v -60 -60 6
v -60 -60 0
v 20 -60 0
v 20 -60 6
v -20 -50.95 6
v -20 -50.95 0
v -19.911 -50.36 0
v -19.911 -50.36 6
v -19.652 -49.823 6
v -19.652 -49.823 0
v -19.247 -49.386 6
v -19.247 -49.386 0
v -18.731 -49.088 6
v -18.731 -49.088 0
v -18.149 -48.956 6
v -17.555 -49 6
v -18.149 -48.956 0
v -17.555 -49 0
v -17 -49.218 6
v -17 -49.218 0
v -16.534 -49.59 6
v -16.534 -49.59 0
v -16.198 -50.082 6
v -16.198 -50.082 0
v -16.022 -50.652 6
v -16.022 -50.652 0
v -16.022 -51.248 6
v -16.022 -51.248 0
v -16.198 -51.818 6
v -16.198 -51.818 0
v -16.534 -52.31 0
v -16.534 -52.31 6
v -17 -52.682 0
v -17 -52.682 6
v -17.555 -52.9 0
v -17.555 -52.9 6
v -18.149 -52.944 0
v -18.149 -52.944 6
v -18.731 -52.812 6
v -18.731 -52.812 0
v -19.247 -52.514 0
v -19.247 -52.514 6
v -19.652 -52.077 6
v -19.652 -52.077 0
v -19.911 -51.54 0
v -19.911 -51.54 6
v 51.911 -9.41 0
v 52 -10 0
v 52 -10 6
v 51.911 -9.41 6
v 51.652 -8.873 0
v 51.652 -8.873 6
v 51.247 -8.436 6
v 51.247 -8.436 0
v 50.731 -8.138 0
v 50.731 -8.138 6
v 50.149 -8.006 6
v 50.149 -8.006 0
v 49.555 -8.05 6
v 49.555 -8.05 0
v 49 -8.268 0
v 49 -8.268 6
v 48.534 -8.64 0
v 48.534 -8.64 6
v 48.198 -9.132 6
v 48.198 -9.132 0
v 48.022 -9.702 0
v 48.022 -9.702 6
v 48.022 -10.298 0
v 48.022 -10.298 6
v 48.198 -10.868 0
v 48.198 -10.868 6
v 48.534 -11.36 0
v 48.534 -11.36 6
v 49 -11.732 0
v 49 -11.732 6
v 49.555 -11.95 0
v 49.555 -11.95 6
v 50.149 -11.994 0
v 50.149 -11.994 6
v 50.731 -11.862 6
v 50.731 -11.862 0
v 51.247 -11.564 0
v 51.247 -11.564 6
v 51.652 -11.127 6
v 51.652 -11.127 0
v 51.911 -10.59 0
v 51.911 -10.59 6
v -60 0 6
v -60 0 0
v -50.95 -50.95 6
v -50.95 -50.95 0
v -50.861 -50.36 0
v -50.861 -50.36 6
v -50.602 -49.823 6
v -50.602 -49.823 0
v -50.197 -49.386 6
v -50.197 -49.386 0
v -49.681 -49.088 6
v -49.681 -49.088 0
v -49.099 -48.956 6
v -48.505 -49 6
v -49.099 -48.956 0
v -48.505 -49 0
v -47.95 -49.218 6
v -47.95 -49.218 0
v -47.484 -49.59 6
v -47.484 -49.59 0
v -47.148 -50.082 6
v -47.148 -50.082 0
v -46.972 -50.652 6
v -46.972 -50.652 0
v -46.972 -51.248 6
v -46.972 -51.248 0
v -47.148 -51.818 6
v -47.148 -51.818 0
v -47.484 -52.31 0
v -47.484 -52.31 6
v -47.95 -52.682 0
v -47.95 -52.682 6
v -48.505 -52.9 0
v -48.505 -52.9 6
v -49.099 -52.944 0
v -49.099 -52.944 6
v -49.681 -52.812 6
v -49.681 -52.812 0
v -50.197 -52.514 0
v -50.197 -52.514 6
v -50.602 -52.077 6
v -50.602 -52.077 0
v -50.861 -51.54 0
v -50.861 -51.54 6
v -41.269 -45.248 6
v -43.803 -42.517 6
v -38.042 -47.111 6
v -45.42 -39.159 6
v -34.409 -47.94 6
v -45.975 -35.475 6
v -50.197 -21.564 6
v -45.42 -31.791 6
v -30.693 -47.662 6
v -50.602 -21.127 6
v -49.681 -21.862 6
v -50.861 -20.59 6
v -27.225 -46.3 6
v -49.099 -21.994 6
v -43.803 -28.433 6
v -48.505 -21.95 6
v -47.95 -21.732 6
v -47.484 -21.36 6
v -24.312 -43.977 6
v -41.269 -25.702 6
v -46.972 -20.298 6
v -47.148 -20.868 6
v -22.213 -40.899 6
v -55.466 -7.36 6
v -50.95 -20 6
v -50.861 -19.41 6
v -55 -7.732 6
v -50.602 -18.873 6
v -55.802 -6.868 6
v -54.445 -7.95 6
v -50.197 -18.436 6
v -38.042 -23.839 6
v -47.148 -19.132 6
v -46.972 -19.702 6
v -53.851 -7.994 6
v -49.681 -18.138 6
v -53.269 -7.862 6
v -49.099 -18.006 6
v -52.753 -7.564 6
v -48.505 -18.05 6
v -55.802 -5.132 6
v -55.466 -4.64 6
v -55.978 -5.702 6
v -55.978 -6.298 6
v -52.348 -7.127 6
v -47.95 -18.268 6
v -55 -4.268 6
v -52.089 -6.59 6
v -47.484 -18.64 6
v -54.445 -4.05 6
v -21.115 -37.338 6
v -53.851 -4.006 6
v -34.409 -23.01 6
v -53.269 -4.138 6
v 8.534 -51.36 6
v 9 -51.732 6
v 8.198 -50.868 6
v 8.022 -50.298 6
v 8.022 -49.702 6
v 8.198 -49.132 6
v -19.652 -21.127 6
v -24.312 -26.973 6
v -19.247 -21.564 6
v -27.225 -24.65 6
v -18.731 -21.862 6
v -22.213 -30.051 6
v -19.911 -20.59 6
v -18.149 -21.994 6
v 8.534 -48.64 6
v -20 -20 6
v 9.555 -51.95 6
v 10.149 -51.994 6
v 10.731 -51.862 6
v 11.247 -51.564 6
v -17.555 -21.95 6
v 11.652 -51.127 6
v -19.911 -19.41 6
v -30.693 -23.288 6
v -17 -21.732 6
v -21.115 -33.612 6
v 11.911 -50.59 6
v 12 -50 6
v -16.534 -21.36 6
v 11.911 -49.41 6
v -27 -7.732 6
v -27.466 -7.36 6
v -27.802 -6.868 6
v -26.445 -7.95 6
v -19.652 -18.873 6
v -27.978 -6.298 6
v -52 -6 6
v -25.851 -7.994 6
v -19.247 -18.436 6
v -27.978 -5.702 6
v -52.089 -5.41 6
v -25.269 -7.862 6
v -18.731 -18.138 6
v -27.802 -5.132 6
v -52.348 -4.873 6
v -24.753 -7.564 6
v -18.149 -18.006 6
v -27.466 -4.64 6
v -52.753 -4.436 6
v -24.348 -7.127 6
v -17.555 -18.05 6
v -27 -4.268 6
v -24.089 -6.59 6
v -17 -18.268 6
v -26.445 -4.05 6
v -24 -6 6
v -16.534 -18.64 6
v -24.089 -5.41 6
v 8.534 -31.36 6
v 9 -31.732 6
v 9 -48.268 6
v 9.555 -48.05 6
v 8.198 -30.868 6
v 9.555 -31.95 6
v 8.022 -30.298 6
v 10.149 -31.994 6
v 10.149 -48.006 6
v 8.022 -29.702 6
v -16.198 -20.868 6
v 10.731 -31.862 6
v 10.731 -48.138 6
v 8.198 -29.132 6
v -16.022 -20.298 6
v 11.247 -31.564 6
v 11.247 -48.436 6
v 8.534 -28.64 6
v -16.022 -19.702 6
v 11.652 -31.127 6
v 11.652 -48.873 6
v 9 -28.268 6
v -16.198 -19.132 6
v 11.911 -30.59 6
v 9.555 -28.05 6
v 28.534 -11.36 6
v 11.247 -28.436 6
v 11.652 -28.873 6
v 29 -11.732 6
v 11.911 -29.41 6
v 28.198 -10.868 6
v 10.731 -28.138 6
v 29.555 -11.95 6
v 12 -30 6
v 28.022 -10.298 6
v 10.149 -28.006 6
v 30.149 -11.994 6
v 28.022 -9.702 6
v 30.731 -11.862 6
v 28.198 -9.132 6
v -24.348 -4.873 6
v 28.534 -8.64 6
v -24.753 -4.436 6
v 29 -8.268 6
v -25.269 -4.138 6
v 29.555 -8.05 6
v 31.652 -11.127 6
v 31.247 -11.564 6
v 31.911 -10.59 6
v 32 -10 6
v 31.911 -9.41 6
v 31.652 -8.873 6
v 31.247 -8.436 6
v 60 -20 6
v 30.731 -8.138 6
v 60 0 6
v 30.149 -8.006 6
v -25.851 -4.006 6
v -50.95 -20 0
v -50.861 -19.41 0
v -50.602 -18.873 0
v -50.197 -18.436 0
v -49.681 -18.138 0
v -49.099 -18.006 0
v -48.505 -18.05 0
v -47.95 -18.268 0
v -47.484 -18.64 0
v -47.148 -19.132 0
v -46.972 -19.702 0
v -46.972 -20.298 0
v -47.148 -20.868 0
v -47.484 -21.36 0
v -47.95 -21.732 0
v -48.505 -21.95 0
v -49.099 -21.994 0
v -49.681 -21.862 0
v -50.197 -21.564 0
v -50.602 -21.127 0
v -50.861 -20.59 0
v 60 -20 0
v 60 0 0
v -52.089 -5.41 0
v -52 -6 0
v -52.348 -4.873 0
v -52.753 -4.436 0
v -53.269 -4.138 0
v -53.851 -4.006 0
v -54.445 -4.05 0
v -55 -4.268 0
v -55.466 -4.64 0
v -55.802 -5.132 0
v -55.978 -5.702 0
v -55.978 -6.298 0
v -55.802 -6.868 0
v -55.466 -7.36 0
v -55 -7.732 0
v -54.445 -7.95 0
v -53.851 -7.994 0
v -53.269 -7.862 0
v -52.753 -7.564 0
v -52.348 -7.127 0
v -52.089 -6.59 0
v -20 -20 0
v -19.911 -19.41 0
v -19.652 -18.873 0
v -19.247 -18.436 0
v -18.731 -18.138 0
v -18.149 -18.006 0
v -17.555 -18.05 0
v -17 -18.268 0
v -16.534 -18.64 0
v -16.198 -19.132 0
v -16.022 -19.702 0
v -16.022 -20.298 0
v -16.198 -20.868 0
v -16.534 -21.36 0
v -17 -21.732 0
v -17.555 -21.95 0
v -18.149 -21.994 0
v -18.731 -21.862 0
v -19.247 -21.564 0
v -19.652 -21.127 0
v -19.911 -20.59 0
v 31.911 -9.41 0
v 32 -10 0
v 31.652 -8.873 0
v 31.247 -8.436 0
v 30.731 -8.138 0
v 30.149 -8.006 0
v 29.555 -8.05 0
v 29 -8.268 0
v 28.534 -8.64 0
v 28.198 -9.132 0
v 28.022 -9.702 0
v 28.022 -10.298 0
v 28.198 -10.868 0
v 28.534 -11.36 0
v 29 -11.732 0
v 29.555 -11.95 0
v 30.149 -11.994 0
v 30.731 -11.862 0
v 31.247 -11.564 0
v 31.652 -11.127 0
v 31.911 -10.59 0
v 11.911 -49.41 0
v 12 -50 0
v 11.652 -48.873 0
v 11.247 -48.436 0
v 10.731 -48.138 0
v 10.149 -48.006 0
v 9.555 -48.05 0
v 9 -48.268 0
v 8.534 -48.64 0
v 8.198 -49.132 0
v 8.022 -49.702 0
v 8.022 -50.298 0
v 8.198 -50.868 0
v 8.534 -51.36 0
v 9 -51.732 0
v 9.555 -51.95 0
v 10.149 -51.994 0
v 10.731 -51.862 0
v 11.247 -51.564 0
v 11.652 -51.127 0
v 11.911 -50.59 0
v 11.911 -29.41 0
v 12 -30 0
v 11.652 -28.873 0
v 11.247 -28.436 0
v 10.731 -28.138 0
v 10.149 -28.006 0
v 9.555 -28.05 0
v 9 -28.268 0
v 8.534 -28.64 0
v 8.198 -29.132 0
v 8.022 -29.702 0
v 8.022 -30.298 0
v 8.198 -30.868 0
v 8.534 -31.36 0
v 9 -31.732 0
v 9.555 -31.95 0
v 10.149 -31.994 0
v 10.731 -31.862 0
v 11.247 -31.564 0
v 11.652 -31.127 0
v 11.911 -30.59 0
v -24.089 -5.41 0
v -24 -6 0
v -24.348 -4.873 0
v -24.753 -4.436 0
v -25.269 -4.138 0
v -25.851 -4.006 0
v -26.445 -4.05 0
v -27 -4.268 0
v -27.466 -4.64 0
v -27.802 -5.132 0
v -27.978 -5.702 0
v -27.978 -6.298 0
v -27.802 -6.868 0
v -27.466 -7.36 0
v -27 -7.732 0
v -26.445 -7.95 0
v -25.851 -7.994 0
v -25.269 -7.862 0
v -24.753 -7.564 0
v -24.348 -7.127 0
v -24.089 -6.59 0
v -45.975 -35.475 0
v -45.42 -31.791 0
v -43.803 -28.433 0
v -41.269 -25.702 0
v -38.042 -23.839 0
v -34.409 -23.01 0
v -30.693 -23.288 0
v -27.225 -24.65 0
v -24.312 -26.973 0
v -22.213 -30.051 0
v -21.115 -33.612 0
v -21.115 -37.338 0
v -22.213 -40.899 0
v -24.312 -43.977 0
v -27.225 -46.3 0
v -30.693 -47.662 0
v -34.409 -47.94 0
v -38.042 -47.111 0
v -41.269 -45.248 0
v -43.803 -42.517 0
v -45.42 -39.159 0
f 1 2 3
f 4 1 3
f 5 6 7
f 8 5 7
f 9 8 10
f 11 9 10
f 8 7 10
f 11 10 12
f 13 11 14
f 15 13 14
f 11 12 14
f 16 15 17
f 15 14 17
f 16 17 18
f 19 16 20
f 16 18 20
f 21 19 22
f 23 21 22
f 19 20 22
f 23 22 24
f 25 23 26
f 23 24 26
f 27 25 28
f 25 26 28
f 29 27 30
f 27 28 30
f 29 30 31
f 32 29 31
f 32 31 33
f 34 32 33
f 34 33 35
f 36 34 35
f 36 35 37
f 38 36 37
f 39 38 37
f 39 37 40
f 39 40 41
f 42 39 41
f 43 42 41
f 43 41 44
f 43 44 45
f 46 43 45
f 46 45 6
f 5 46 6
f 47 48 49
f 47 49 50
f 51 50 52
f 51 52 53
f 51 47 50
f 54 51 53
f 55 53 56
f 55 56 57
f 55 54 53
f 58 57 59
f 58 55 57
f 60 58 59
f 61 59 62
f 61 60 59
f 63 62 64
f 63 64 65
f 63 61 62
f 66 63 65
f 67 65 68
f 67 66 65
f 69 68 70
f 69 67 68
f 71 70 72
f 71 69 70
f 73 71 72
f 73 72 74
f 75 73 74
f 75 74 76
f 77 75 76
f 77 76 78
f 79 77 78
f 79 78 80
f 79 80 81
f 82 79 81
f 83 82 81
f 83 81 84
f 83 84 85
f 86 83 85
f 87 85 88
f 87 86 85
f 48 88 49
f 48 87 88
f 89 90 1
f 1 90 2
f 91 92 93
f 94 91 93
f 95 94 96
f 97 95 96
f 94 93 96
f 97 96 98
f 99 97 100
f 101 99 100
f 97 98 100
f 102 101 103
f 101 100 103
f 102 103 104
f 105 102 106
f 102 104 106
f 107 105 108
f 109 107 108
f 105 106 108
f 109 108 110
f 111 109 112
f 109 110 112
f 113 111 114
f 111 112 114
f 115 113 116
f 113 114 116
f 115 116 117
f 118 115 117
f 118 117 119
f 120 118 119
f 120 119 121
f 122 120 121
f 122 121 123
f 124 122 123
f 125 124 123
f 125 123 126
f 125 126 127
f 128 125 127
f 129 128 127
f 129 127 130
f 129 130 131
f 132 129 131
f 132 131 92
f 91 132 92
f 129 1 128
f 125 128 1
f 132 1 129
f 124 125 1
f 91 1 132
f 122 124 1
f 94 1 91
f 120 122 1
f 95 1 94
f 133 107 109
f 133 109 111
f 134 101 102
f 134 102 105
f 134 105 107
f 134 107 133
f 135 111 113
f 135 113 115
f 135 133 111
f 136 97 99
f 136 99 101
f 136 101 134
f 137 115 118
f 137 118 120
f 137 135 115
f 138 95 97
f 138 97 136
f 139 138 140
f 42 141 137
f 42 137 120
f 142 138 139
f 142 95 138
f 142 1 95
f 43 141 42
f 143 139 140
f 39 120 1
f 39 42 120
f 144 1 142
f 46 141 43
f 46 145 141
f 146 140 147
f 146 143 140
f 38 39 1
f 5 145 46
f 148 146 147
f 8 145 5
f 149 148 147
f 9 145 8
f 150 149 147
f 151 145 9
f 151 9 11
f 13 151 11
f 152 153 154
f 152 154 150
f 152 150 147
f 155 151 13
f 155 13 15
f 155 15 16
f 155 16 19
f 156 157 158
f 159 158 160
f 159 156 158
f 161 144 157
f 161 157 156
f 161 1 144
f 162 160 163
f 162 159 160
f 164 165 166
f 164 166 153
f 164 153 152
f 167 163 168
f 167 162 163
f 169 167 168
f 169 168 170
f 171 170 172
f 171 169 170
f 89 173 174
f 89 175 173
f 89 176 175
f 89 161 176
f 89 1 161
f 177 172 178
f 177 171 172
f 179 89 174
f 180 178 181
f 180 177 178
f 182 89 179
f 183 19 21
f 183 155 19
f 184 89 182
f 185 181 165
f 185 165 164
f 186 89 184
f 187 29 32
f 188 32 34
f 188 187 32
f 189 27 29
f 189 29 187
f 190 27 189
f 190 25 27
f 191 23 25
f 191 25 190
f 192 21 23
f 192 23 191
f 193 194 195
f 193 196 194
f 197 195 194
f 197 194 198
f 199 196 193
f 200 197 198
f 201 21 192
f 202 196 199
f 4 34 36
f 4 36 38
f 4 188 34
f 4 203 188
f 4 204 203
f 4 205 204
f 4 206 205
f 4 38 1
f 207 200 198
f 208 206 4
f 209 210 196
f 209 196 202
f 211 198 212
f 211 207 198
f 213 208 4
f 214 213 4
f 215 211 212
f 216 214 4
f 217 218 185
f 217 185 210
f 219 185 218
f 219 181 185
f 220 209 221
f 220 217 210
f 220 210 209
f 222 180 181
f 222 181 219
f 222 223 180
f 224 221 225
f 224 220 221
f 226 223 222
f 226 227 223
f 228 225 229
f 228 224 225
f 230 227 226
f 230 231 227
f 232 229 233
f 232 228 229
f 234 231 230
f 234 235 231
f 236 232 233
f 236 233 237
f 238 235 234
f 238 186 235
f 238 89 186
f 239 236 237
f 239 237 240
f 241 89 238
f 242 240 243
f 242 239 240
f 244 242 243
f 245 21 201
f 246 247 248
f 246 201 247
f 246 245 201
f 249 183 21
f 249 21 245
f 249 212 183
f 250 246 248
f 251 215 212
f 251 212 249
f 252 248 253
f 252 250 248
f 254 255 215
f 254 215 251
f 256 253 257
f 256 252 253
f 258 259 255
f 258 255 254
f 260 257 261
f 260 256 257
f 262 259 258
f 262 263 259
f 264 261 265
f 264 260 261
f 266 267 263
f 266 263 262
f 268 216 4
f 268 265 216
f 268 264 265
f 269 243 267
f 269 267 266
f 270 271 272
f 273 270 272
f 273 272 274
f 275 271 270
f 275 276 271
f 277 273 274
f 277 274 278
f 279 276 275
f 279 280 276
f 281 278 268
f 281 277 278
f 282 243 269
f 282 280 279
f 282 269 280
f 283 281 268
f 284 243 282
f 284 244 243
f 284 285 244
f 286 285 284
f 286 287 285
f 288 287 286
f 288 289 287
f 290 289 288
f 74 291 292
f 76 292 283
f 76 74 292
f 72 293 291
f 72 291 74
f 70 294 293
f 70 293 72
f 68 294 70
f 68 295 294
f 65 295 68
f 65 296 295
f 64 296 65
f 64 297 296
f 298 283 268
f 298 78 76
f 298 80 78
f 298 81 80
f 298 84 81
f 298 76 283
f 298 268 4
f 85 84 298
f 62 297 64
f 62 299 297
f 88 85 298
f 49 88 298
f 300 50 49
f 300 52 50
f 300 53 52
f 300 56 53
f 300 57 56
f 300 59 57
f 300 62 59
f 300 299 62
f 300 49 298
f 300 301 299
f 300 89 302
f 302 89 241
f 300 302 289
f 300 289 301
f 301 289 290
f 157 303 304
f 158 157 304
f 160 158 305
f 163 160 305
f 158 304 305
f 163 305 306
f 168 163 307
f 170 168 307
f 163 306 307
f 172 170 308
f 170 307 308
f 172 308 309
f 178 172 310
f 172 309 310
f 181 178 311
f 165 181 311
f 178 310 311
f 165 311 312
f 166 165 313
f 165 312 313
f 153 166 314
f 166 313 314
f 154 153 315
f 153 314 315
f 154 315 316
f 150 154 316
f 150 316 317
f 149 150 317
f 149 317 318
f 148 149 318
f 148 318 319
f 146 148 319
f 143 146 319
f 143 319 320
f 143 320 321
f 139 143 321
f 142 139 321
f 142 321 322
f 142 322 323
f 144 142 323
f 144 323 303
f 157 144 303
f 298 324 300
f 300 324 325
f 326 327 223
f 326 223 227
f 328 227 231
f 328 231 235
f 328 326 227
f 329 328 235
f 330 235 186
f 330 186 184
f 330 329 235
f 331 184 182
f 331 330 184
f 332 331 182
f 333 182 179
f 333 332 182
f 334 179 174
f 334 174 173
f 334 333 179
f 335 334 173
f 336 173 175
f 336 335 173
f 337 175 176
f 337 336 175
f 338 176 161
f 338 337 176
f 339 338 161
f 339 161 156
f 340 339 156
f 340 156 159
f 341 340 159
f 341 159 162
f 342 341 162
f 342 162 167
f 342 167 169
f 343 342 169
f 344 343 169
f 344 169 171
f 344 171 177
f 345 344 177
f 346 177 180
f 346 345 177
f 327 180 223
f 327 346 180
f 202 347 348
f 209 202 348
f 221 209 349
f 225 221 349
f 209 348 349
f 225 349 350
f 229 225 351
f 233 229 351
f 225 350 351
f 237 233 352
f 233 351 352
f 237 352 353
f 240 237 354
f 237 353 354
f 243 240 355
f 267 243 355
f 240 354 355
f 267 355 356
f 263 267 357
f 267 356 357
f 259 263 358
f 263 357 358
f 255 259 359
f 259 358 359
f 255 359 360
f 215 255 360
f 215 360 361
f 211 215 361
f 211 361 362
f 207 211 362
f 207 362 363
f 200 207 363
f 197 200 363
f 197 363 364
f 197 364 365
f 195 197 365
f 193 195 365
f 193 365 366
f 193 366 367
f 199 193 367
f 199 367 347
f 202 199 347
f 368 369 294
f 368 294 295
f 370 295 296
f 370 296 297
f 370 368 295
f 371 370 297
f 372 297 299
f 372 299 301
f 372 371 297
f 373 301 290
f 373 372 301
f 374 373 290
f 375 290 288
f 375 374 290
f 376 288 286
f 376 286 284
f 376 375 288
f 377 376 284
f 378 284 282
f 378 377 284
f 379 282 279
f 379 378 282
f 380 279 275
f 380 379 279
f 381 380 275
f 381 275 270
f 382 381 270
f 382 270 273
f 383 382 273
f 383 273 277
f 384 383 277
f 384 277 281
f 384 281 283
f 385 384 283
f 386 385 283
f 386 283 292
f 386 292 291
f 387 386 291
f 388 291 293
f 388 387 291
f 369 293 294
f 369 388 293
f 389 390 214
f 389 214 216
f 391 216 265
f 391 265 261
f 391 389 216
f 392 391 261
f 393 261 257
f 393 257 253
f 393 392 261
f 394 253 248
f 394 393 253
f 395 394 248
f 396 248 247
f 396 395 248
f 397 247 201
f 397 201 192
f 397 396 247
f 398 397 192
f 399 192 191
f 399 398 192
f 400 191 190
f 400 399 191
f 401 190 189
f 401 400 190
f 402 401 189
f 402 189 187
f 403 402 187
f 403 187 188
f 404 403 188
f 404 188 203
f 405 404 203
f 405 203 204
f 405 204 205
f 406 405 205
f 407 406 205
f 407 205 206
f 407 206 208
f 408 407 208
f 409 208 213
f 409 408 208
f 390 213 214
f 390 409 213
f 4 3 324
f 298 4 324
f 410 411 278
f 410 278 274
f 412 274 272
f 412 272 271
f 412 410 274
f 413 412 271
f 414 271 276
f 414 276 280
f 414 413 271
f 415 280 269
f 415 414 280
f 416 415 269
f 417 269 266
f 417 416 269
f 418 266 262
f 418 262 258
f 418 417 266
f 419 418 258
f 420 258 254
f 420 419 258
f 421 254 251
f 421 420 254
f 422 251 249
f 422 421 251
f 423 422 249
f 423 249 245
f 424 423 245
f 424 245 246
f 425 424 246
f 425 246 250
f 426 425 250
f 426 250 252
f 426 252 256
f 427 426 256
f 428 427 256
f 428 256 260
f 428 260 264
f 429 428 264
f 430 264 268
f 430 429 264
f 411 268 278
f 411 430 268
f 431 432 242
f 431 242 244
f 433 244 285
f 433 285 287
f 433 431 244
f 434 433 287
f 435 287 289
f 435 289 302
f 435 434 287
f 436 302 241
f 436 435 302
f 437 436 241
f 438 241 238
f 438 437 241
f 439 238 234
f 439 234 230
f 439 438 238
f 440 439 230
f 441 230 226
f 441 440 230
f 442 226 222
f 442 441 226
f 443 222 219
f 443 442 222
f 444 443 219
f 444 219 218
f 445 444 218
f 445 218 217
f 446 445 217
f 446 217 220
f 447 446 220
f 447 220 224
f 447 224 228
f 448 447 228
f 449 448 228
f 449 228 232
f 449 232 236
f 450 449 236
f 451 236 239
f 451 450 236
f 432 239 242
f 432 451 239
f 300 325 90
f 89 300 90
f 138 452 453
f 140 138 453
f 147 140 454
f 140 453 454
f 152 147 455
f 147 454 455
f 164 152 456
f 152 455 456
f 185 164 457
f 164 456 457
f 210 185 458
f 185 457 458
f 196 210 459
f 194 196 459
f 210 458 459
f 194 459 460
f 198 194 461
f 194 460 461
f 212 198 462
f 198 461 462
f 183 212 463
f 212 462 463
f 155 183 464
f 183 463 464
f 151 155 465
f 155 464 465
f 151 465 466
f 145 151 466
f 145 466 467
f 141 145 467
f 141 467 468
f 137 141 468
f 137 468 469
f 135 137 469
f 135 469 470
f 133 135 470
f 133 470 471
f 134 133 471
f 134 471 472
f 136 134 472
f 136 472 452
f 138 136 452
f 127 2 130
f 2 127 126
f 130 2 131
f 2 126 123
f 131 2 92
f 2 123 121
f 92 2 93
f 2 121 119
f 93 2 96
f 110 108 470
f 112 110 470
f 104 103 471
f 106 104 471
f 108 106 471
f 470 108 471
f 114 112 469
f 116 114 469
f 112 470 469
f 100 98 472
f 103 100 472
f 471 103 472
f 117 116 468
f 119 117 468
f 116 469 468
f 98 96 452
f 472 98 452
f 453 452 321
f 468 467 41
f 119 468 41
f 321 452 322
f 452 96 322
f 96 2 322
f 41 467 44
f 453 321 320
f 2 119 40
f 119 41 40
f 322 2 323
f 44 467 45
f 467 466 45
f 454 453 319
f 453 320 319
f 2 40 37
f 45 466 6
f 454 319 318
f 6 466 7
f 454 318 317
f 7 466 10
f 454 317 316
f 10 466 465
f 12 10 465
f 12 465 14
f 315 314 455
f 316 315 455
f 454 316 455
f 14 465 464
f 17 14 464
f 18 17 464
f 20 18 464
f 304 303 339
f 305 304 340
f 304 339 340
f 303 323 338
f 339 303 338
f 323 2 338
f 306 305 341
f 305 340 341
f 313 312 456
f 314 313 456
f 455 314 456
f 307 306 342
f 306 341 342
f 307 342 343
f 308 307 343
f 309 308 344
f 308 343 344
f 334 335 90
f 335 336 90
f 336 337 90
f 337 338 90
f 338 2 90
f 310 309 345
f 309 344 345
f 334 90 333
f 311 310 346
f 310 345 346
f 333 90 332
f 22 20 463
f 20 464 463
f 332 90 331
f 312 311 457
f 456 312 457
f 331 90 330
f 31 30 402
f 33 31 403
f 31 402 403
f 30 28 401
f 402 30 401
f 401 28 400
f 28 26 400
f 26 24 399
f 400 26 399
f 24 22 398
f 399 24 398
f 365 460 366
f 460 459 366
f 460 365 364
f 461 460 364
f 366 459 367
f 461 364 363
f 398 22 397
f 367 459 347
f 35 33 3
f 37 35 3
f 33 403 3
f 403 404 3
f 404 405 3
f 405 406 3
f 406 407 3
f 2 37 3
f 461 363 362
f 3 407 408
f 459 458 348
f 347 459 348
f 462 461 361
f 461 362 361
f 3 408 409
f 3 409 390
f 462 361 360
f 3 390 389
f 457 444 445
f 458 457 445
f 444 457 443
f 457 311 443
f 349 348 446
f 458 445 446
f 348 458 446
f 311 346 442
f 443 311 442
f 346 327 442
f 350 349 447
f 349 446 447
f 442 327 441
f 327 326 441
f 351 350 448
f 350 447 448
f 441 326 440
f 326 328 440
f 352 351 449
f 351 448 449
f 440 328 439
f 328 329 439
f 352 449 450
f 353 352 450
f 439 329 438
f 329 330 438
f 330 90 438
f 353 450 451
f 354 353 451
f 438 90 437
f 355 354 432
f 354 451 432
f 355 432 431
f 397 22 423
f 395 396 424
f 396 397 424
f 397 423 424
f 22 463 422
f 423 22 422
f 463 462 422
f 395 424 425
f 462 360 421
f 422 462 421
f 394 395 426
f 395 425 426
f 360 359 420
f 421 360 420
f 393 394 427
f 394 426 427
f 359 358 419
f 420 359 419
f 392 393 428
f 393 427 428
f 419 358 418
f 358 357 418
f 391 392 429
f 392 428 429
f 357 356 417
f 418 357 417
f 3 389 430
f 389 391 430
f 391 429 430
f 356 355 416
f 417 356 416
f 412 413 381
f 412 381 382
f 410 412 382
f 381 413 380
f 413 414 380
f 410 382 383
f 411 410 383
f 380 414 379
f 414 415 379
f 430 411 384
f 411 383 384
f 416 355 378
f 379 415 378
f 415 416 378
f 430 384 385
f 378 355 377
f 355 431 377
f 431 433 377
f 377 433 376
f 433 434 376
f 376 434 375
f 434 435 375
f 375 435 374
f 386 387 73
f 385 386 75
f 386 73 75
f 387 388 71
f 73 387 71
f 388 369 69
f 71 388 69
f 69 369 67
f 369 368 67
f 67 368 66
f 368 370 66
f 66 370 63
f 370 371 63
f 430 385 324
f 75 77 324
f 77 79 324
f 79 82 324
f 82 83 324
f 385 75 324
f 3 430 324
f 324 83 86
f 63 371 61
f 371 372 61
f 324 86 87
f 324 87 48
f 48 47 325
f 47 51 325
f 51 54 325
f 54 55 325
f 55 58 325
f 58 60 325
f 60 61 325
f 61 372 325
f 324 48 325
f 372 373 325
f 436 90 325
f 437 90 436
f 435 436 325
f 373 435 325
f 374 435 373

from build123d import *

# Parameters (mm, degrees)
SKETCH1_R           = 2
BOSS_EXTRUDE1_DEPTH = 6
SKETCH2_R           = 2
SKETCH2_R_2         = 12.5
CUT_EXTRUDE1_DEPTH  = 10


with BuildPart() as part:
    # Sketch1 → Boss-Extrude1 (new body)
    with BuildSketch(Plane.XY):
        Polygon((20, -60), (60, -20), (60, 0), (0, 0), (-60, 0), (-60, -60), (0, -60), align=None)
        with Locations((50, -10)):
            Circle(SKETCH1_R, mode=Mode.SUBTRACT)
        with Locations((30, -10)):
            Circle(SKETCH1_R, mode=Mode.SUBTRACT)
        with Locations((10, -50)):
            Circle(SKETCH1_R, mode=Mode.SUBTRACT)
        with Locations((10, -30)):
            Circle(SKETCH1_R, mode=Mode.SUBTRACT)
        with Locations((-54, -6)):
            Circle(SKETCH1_R, mode=Mode.SUBTRACT)
        with Locations((-26, -6)):
            Circle(SKETCH1_R, mode=Mode.SUBTRACT)
    extrude(amount=BOSS_EXTRUDE1_DEPTH)

    # Sketch2 → Cut-Extrude1 (cut)
    with BuildSketch(Plane(origin=(0, 0, 0), x_dir=(-1, 0, 0), z_dir=(0, 0, -1))):
        with Locations((18, -20)):
            Circle(SKETCH2_R)
        with Locations((18, -50.95)):
            Circle(SKETCH2_R)
        with Locations((48.95, -20)):
            Circle(SKETCH2_R)
        with Locations((48.95, -50.95)):
            Circle(SKETCH2_R)
        with Locations((33.475, -35.475)):
            Circle(SKETCH2_R_2)
    extrude(amount=-CUT_EXTRUDE1_DEPTH, mode=Mode.SUBTRACT)


solid = part.part
